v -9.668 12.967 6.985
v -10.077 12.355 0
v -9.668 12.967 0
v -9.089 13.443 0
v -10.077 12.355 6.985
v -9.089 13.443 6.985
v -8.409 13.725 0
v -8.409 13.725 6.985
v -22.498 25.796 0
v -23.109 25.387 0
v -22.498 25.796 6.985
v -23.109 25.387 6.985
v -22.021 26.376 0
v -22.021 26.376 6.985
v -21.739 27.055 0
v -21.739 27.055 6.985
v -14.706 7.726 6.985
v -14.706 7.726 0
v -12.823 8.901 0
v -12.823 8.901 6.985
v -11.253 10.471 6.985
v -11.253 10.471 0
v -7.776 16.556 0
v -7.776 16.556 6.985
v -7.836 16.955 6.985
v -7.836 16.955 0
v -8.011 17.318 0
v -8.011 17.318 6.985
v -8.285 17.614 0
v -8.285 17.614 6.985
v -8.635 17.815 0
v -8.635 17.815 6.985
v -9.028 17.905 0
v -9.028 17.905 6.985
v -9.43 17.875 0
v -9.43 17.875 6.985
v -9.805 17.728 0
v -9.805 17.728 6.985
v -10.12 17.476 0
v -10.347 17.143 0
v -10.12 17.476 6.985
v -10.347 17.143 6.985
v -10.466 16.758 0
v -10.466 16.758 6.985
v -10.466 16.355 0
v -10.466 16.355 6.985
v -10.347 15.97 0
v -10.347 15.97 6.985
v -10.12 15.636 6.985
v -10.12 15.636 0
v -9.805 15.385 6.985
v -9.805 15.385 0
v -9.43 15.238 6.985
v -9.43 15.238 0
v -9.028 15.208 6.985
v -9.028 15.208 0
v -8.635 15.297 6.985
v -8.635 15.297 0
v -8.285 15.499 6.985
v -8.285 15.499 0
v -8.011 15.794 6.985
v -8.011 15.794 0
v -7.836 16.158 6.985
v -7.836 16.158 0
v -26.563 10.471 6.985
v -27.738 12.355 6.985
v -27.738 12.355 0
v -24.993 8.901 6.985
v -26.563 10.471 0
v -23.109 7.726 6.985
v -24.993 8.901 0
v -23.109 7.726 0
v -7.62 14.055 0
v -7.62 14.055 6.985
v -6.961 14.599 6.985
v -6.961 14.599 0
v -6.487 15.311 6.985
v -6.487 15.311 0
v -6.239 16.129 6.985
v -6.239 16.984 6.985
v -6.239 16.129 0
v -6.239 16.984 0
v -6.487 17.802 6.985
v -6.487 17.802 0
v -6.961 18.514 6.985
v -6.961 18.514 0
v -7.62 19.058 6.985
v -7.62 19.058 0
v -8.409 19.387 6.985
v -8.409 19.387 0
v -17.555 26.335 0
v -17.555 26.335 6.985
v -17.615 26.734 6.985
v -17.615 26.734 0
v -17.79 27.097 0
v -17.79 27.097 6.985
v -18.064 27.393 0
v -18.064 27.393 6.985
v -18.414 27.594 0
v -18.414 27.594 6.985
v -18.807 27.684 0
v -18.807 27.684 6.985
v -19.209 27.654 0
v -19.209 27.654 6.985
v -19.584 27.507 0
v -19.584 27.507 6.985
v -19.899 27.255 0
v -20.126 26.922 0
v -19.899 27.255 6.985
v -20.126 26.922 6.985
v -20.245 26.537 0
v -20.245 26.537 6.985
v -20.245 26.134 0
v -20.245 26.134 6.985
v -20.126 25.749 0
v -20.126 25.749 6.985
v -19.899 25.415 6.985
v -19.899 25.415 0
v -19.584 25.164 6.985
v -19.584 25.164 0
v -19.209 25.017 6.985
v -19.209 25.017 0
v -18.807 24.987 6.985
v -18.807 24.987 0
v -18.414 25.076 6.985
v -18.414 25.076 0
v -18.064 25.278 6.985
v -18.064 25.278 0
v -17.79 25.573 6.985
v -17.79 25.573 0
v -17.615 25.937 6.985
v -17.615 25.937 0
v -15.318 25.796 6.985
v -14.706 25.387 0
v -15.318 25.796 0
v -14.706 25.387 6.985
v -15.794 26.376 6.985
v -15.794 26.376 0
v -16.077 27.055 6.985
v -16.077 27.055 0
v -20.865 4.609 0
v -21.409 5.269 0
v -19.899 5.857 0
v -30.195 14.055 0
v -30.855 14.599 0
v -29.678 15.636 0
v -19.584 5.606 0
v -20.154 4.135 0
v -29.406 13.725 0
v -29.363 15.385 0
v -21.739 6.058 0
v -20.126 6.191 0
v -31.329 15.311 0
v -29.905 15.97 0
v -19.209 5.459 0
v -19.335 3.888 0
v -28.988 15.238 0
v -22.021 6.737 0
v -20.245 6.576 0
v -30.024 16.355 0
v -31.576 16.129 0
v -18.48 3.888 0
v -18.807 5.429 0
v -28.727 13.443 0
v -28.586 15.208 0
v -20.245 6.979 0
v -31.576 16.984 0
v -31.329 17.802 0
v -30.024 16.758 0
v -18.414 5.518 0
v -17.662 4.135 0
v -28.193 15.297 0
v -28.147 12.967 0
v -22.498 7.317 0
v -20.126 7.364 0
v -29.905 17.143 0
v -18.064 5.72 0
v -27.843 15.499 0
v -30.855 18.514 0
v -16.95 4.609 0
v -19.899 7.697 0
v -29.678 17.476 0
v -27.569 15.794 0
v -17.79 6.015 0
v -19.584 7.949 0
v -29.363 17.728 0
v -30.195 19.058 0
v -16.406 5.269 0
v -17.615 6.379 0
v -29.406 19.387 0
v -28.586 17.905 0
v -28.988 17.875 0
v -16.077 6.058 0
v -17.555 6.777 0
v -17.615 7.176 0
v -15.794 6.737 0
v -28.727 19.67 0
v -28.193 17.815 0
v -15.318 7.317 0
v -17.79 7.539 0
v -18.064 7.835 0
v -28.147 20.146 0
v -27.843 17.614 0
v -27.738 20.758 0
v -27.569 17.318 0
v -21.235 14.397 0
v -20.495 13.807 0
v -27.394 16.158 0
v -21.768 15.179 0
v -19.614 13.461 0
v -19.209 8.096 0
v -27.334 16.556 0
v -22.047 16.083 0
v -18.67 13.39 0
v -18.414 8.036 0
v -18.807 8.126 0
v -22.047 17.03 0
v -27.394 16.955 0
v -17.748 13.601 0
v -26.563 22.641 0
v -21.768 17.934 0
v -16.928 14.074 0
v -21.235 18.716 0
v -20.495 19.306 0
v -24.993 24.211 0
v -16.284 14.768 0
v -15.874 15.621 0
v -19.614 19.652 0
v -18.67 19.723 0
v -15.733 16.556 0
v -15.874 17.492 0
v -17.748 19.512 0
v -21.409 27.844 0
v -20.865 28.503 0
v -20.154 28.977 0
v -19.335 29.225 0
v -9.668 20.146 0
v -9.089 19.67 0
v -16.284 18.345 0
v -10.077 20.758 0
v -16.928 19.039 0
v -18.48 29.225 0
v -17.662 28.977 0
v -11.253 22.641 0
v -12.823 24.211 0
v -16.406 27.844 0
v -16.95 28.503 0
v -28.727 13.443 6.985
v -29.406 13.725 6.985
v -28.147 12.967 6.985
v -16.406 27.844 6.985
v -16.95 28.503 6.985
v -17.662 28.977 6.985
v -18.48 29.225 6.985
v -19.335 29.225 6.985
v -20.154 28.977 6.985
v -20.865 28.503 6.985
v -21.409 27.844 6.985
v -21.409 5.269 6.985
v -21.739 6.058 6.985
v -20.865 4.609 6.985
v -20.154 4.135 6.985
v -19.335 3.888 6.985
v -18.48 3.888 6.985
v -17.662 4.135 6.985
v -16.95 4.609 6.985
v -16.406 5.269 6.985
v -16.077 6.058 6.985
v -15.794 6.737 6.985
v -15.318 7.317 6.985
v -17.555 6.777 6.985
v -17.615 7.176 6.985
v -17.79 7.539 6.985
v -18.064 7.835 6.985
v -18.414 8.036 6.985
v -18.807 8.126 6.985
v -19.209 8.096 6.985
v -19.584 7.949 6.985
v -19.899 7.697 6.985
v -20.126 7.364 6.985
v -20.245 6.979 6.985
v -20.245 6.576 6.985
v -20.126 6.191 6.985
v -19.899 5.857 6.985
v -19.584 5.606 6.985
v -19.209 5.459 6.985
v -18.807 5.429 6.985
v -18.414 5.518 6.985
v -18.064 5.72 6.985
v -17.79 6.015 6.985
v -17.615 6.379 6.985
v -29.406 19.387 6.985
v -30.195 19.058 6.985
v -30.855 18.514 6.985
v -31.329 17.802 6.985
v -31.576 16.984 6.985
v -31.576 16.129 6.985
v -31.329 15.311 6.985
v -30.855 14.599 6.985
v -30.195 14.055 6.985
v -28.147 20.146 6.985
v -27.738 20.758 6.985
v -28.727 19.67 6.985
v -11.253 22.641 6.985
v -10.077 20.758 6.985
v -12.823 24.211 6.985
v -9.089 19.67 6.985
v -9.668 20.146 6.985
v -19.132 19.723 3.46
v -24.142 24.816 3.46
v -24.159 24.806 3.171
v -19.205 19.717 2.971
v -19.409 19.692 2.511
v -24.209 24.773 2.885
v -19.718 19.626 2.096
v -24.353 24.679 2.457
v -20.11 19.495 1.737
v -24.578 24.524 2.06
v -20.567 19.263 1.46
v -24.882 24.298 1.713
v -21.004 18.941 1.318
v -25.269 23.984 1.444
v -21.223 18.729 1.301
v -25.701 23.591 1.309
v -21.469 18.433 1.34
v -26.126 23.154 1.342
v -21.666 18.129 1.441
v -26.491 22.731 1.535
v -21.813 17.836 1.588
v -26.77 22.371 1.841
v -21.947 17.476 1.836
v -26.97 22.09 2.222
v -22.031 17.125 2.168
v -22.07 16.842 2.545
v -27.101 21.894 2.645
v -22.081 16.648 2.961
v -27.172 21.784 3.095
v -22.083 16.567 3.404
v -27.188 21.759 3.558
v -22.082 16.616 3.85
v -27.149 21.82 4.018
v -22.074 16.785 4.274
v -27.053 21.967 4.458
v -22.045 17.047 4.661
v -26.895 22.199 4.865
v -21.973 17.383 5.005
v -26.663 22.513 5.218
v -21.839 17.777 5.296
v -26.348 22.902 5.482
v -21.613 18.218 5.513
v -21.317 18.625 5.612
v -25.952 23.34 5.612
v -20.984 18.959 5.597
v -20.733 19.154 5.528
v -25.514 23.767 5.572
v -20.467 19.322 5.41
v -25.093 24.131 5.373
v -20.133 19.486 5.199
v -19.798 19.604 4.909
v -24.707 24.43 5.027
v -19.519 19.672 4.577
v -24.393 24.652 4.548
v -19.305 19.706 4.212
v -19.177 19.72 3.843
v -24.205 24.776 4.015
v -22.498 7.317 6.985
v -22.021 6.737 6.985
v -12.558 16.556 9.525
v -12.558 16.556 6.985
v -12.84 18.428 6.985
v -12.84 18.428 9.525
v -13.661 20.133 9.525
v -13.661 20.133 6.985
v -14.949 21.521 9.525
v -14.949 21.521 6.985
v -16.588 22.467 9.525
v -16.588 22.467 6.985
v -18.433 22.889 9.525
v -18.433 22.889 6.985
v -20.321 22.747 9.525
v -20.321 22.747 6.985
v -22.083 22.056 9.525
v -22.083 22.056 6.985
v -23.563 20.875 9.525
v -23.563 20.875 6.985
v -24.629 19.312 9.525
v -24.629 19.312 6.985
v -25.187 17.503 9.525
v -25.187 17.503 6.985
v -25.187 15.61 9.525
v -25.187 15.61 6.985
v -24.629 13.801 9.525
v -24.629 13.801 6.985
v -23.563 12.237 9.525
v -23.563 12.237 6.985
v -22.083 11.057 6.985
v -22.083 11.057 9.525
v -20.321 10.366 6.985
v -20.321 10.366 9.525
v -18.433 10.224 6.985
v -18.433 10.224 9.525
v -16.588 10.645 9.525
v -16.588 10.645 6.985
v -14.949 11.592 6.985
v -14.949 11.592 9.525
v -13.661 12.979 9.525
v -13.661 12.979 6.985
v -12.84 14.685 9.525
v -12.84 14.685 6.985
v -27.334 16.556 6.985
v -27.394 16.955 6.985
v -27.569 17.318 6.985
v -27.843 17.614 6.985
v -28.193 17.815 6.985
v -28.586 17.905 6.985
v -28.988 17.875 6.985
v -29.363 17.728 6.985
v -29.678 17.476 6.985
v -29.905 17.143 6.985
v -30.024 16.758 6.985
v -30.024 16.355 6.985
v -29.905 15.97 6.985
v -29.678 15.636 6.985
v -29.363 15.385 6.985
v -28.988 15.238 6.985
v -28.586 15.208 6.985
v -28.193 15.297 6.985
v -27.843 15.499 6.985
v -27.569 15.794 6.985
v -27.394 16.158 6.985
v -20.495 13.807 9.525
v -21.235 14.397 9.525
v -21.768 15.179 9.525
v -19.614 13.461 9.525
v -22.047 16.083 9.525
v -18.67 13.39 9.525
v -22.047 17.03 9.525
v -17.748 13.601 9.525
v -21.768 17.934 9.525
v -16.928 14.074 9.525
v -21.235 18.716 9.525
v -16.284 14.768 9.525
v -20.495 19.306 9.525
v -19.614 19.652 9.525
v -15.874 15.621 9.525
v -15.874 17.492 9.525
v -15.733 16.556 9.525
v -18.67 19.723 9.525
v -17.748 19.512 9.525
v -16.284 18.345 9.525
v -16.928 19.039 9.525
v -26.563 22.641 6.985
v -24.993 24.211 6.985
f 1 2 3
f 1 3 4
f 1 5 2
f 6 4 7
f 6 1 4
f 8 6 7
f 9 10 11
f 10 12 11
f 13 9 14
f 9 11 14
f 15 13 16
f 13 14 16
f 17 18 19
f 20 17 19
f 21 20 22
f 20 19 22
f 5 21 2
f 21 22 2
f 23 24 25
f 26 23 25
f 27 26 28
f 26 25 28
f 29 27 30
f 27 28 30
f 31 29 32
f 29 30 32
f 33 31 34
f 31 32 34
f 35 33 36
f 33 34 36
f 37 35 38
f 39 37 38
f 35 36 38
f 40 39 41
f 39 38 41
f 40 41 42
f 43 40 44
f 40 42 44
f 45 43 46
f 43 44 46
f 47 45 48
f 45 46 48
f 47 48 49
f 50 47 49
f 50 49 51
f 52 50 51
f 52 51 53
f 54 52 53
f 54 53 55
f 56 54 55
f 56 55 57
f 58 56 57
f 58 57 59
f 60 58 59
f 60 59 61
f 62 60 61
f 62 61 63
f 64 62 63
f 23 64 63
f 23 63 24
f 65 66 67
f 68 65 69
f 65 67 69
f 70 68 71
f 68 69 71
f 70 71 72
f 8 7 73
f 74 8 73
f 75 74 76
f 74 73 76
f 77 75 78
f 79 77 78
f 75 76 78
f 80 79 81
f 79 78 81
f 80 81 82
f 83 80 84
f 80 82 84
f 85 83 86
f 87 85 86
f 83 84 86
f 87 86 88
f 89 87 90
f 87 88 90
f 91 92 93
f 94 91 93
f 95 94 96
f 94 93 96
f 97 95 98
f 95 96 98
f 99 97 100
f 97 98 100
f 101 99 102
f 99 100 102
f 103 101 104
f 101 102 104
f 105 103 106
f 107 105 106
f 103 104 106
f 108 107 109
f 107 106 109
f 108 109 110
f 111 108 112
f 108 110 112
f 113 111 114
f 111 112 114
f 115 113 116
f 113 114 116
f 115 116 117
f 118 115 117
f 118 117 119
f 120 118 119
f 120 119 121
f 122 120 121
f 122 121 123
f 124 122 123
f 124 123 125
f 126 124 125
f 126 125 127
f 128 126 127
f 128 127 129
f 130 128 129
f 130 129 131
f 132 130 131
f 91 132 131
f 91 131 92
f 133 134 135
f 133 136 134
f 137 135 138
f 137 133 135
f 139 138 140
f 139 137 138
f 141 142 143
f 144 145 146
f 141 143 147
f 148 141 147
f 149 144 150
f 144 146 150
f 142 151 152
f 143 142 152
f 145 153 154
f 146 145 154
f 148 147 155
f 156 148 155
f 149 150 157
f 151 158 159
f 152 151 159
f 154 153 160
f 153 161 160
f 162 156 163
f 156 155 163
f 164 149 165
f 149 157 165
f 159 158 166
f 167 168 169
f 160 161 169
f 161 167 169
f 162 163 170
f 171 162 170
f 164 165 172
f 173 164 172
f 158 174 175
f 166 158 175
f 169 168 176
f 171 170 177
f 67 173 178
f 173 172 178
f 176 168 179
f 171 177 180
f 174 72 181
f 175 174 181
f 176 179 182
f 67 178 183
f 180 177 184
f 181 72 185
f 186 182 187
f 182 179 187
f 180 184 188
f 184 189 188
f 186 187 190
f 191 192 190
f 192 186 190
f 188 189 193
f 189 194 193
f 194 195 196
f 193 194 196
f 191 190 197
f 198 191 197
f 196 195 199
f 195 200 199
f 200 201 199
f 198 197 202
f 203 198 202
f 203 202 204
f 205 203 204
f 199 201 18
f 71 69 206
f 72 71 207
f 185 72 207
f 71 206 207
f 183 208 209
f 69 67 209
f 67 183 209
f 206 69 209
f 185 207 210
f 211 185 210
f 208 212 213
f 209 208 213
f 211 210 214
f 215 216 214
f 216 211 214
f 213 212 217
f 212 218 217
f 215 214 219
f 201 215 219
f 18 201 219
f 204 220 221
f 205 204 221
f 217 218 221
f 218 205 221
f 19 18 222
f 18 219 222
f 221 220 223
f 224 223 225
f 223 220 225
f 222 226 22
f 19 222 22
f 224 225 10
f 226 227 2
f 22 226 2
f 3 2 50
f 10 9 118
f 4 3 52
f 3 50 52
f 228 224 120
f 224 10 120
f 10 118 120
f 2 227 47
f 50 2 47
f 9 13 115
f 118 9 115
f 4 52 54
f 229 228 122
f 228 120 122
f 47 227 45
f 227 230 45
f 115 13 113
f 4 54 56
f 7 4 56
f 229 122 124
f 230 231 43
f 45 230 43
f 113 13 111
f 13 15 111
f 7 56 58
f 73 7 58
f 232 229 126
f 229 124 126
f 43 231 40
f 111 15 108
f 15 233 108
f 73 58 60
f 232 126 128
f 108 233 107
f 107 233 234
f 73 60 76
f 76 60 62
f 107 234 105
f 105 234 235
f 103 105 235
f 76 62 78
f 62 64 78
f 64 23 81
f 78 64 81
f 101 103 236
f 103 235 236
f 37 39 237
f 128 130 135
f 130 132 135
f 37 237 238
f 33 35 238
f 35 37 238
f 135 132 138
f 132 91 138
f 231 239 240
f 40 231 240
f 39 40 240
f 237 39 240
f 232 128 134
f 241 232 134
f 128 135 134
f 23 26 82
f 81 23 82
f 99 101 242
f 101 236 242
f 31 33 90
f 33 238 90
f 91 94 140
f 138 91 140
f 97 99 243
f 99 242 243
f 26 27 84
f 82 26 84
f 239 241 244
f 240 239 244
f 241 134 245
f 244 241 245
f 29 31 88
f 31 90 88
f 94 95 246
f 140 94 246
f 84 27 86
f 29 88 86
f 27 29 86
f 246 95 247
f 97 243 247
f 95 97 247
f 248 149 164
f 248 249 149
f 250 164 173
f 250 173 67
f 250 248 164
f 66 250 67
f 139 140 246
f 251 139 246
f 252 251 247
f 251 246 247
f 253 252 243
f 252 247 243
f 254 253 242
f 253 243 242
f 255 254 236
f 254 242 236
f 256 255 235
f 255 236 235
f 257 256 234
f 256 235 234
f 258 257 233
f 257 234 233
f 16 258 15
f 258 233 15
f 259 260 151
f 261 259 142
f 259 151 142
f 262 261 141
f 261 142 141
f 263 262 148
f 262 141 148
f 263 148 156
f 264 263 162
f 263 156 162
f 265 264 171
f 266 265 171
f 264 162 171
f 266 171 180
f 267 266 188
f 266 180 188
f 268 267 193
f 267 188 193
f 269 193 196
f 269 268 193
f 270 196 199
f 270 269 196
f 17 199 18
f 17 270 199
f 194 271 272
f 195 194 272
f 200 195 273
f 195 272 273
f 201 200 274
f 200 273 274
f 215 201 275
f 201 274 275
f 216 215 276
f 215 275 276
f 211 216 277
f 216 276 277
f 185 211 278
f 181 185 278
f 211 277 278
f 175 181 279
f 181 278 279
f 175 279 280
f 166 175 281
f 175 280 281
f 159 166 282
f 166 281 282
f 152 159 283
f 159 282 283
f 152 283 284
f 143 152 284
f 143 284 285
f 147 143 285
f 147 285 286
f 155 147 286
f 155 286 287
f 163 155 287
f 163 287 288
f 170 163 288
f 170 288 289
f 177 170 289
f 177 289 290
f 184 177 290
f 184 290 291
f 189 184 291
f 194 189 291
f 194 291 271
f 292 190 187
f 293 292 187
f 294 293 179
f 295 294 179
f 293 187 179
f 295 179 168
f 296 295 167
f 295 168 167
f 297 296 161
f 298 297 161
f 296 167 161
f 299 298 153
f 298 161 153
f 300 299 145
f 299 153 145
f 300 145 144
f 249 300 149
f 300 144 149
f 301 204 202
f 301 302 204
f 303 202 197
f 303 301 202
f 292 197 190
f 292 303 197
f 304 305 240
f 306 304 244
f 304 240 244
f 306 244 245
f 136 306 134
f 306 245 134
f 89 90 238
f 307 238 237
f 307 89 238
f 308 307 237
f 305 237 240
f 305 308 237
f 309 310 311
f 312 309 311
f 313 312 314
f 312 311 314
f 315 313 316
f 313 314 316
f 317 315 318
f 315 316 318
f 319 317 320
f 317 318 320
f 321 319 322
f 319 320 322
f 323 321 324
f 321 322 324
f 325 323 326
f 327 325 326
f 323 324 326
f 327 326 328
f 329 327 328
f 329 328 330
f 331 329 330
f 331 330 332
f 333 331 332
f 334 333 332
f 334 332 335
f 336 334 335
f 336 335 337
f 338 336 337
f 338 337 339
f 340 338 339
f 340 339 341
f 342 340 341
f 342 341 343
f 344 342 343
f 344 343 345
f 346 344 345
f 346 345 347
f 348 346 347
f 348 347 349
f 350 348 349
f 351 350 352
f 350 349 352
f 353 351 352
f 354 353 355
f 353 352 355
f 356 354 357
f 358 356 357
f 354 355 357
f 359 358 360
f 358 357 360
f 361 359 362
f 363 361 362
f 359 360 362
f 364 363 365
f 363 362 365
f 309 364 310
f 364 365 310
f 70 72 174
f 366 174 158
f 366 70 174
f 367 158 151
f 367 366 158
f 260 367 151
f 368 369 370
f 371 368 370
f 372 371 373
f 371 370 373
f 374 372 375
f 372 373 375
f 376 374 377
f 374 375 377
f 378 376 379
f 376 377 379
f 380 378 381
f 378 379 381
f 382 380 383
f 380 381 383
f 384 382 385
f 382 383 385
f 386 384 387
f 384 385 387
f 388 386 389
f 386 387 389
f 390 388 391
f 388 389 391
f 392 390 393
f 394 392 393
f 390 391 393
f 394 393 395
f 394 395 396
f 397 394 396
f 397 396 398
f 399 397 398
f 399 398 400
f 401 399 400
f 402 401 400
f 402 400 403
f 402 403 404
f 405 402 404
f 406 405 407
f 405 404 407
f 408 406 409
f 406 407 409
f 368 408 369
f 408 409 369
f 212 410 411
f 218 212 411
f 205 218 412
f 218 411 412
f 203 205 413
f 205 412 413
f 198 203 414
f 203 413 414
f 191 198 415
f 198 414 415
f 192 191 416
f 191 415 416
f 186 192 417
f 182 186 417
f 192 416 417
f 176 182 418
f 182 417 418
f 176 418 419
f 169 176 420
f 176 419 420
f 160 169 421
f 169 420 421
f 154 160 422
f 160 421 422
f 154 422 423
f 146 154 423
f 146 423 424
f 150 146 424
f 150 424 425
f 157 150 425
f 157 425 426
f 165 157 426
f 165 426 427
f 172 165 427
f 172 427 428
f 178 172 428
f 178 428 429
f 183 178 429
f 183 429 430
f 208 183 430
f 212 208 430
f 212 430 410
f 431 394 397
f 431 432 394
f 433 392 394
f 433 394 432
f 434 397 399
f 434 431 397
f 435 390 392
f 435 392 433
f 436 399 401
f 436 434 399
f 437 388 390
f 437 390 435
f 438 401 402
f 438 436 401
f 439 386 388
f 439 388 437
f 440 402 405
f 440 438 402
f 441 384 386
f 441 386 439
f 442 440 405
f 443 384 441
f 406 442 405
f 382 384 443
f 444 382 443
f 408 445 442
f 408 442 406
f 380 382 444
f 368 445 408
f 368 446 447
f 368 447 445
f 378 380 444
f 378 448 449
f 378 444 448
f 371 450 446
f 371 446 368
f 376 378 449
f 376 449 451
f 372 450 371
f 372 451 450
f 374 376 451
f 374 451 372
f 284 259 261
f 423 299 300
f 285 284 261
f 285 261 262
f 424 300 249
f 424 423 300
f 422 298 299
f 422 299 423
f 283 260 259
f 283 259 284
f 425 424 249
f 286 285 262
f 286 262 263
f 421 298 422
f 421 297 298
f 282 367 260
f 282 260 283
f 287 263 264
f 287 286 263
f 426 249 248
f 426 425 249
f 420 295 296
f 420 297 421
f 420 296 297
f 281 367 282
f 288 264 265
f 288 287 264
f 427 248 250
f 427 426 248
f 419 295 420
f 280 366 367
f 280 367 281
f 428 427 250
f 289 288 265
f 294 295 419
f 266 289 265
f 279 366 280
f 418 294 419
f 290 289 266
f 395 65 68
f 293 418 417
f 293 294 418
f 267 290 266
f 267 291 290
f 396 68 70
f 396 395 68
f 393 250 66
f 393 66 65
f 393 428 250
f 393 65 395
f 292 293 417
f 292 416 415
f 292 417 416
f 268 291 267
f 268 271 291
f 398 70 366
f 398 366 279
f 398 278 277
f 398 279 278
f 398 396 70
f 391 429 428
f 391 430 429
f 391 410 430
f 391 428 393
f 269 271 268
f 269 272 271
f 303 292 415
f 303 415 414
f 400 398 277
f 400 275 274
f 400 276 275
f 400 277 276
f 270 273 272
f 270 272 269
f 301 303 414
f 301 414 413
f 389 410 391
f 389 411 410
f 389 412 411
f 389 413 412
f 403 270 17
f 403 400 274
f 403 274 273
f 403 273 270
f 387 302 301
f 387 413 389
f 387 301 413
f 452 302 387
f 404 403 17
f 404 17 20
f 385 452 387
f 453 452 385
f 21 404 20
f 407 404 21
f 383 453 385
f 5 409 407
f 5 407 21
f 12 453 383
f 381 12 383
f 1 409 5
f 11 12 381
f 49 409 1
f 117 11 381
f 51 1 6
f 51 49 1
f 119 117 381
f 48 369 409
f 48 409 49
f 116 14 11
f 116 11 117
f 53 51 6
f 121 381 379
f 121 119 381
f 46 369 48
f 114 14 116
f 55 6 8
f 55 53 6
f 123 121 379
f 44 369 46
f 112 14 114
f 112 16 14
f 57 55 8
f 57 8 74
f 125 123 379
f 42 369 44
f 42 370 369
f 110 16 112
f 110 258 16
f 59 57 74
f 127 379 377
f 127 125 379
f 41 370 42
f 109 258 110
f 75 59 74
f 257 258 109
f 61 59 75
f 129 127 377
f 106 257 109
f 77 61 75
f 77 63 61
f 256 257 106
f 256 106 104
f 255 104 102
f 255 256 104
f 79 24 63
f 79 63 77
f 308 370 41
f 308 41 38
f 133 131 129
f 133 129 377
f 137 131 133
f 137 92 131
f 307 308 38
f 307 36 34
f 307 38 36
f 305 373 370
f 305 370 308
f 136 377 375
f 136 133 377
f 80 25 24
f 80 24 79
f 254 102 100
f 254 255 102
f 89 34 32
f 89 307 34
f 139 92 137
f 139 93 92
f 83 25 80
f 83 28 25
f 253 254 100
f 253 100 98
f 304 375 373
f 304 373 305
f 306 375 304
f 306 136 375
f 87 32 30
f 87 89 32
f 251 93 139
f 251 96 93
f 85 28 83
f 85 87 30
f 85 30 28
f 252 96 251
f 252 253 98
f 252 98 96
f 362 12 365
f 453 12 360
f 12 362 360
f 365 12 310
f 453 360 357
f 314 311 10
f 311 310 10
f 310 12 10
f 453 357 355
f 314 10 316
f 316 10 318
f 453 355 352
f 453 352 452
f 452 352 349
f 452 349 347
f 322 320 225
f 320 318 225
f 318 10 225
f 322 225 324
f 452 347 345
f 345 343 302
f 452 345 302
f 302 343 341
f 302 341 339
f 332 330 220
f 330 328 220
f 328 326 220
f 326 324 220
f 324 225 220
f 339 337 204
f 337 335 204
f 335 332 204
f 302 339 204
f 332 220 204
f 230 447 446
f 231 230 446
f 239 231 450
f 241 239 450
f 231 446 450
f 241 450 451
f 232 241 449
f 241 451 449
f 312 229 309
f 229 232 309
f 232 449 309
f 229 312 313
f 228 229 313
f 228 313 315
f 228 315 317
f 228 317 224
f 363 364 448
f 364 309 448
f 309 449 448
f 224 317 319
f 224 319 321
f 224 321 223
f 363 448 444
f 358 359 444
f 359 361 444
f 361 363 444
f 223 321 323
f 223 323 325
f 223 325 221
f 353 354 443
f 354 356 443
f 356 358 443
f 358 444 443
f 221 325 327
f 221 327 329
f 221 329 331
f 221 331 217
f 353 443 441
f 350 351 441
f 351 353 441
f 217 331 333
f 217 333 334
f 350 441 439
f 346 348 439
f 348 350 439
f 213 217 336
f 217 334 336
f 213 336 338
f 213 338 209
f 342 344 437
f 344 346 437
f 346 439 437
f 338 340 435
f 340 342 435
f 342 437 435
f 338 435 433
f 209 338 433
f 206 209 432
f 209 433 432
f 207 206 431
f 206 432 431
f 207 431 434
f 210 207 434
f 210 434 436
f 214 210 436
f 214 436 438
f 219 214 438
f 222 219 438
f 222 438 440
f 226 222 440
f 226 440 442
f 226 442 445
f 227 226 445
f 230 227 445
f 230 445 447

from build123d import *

# Parameters (mm, degrees)
BOSS_EXTRUDE2_DEPTH   = 6.985
FILLET3_R             = 2.54
SKETCH2_R             = 6.35
BOSS_EXTRUDE3_DEPTH   = 2.54
SKETCH3_R             = 3.175
CUT_EXTRUDE1_DEPTH    = 9.525
F_6_32_TAPPED_HOLE1_D = 2.7051
SKETCH12_R            = 2.159
CUT_EXTRUDE4_DEPTH    = 9.906


with BuildPart() as part:
    # Sketch1 → Boss-Extrude2 (new body)
    with BuildSketch(Plane.XY):
        with BuildLine():
            ThreePointArc((-21.795940027, 25.899130336), (-25.822498312, 23.471180796), (-28.250447852, 19.444622511))
            ThreePointArc((-28.250447852, 19.444622511), (-31.607701099, 16.556383583), (-28.250447852, 13.668144655))
            ThreePointArc((-28.250447852, 13.668144655), (-25.822498312, 9.64158637), (-21.795940027, 7.21363683))
            ThreePointArc((-21.795940027, 7.21363683), (-18.907701099, 3.856383583), (-16.019462171, 7.21363683))
            ThreePointArc((-16.019462171, 7.21363683), (-11.992903886, 9.64158637), (-9.564954346, 13.668144655))
            ThreePointArc((-9.564954346, 13.668144655), (-6.207701099, 16.556383583), (-9.564954346, 19.444622511))
            ThreePointArc((-9.564954346, 19.444622511), (-11.992903886, 23.471180796), (-16.019462171, 25.899130336))
            ThreePointArc((-16.019462171, 25.899130336), (-18.907701099, 29.256383583), (-21.795940027, 25.899130336))
        make_face()
    extrude(amount=BOSS_EXTRUDE2_DEPTH)

    # Fillet3
    fillet3_edges = [part.edges().sort_by_distance(p)[0] for p in [
        (-16.019462171, 7.21363683, 3.4925),
        (-21.795940027, 7.21363683, 3.4925),
        (-28.250447852, 13.668144655, 3.4925),
        (-28.250447852, 19.444622511, 3.4925),
        (-21.795940027, 25.899130336, 3.4925),
        (-16.019462171, 25.899130336, 3.4925),
        (-9.564954346, 19.444622511, 3.4925),
        (-9.564954346, 13.668144655, 3.4925),
    ]]
    fillet(fillet3_edges, radius=FILLET3_R)

    # Sketch2 → Boss-Extrude3 (add)
    with BuildSketch(Plane.XY.offset(6.985)):
        with Locations((-18.907701099, 16.556383583)):
            Circle(SKETCH2_R)
    extrude(amount=BOSS_EXTRUDE3_DEPTH)

    # Sketch3 → Cut-Extrude1 (cut)
    with BuildSketch(Plane.XY.offset(9.525)):
        with Locations((-18.907701099, 16.556383583)):
            Circle(SKETCH3_R)
    extrude(amount=-CUT_EXTRUDE1_DEPTH, mode=Mode.SUBTRACT)

    # #6-32 Tapped Hole1 (through all)
    with Locations(Plane(origin=(0, 0, 0), x_dir=(-1, 0, 0), z_dir=(0, 0, -1))):
        with Locations((18.907701099, 26.335383583), (28.686701099, 16.556383583), (18.907701099, 6.777383583), (9.128701099, 16.556383583)):
            Hole(F_6_32_TAPPED_HOLE1_D / 2)

    # Sketch12 → Cut-Extrude4 (cut)
    with BuildSketch(Plane(origin=(-24.434266922, 24.837342139, 0), x_dir=(0.712867541, 0.701298701, 0), z_dir=(-0.701298701, 0.712867541, 0))):
        with Locations((-1.965596828, -3.45963024)):
            Circle(SKETCH12_R)
    extrude(amount=-CUT_EXTRUDE4_DEPTH, mode=Mode.SUBTRACT)


solid = part.part
